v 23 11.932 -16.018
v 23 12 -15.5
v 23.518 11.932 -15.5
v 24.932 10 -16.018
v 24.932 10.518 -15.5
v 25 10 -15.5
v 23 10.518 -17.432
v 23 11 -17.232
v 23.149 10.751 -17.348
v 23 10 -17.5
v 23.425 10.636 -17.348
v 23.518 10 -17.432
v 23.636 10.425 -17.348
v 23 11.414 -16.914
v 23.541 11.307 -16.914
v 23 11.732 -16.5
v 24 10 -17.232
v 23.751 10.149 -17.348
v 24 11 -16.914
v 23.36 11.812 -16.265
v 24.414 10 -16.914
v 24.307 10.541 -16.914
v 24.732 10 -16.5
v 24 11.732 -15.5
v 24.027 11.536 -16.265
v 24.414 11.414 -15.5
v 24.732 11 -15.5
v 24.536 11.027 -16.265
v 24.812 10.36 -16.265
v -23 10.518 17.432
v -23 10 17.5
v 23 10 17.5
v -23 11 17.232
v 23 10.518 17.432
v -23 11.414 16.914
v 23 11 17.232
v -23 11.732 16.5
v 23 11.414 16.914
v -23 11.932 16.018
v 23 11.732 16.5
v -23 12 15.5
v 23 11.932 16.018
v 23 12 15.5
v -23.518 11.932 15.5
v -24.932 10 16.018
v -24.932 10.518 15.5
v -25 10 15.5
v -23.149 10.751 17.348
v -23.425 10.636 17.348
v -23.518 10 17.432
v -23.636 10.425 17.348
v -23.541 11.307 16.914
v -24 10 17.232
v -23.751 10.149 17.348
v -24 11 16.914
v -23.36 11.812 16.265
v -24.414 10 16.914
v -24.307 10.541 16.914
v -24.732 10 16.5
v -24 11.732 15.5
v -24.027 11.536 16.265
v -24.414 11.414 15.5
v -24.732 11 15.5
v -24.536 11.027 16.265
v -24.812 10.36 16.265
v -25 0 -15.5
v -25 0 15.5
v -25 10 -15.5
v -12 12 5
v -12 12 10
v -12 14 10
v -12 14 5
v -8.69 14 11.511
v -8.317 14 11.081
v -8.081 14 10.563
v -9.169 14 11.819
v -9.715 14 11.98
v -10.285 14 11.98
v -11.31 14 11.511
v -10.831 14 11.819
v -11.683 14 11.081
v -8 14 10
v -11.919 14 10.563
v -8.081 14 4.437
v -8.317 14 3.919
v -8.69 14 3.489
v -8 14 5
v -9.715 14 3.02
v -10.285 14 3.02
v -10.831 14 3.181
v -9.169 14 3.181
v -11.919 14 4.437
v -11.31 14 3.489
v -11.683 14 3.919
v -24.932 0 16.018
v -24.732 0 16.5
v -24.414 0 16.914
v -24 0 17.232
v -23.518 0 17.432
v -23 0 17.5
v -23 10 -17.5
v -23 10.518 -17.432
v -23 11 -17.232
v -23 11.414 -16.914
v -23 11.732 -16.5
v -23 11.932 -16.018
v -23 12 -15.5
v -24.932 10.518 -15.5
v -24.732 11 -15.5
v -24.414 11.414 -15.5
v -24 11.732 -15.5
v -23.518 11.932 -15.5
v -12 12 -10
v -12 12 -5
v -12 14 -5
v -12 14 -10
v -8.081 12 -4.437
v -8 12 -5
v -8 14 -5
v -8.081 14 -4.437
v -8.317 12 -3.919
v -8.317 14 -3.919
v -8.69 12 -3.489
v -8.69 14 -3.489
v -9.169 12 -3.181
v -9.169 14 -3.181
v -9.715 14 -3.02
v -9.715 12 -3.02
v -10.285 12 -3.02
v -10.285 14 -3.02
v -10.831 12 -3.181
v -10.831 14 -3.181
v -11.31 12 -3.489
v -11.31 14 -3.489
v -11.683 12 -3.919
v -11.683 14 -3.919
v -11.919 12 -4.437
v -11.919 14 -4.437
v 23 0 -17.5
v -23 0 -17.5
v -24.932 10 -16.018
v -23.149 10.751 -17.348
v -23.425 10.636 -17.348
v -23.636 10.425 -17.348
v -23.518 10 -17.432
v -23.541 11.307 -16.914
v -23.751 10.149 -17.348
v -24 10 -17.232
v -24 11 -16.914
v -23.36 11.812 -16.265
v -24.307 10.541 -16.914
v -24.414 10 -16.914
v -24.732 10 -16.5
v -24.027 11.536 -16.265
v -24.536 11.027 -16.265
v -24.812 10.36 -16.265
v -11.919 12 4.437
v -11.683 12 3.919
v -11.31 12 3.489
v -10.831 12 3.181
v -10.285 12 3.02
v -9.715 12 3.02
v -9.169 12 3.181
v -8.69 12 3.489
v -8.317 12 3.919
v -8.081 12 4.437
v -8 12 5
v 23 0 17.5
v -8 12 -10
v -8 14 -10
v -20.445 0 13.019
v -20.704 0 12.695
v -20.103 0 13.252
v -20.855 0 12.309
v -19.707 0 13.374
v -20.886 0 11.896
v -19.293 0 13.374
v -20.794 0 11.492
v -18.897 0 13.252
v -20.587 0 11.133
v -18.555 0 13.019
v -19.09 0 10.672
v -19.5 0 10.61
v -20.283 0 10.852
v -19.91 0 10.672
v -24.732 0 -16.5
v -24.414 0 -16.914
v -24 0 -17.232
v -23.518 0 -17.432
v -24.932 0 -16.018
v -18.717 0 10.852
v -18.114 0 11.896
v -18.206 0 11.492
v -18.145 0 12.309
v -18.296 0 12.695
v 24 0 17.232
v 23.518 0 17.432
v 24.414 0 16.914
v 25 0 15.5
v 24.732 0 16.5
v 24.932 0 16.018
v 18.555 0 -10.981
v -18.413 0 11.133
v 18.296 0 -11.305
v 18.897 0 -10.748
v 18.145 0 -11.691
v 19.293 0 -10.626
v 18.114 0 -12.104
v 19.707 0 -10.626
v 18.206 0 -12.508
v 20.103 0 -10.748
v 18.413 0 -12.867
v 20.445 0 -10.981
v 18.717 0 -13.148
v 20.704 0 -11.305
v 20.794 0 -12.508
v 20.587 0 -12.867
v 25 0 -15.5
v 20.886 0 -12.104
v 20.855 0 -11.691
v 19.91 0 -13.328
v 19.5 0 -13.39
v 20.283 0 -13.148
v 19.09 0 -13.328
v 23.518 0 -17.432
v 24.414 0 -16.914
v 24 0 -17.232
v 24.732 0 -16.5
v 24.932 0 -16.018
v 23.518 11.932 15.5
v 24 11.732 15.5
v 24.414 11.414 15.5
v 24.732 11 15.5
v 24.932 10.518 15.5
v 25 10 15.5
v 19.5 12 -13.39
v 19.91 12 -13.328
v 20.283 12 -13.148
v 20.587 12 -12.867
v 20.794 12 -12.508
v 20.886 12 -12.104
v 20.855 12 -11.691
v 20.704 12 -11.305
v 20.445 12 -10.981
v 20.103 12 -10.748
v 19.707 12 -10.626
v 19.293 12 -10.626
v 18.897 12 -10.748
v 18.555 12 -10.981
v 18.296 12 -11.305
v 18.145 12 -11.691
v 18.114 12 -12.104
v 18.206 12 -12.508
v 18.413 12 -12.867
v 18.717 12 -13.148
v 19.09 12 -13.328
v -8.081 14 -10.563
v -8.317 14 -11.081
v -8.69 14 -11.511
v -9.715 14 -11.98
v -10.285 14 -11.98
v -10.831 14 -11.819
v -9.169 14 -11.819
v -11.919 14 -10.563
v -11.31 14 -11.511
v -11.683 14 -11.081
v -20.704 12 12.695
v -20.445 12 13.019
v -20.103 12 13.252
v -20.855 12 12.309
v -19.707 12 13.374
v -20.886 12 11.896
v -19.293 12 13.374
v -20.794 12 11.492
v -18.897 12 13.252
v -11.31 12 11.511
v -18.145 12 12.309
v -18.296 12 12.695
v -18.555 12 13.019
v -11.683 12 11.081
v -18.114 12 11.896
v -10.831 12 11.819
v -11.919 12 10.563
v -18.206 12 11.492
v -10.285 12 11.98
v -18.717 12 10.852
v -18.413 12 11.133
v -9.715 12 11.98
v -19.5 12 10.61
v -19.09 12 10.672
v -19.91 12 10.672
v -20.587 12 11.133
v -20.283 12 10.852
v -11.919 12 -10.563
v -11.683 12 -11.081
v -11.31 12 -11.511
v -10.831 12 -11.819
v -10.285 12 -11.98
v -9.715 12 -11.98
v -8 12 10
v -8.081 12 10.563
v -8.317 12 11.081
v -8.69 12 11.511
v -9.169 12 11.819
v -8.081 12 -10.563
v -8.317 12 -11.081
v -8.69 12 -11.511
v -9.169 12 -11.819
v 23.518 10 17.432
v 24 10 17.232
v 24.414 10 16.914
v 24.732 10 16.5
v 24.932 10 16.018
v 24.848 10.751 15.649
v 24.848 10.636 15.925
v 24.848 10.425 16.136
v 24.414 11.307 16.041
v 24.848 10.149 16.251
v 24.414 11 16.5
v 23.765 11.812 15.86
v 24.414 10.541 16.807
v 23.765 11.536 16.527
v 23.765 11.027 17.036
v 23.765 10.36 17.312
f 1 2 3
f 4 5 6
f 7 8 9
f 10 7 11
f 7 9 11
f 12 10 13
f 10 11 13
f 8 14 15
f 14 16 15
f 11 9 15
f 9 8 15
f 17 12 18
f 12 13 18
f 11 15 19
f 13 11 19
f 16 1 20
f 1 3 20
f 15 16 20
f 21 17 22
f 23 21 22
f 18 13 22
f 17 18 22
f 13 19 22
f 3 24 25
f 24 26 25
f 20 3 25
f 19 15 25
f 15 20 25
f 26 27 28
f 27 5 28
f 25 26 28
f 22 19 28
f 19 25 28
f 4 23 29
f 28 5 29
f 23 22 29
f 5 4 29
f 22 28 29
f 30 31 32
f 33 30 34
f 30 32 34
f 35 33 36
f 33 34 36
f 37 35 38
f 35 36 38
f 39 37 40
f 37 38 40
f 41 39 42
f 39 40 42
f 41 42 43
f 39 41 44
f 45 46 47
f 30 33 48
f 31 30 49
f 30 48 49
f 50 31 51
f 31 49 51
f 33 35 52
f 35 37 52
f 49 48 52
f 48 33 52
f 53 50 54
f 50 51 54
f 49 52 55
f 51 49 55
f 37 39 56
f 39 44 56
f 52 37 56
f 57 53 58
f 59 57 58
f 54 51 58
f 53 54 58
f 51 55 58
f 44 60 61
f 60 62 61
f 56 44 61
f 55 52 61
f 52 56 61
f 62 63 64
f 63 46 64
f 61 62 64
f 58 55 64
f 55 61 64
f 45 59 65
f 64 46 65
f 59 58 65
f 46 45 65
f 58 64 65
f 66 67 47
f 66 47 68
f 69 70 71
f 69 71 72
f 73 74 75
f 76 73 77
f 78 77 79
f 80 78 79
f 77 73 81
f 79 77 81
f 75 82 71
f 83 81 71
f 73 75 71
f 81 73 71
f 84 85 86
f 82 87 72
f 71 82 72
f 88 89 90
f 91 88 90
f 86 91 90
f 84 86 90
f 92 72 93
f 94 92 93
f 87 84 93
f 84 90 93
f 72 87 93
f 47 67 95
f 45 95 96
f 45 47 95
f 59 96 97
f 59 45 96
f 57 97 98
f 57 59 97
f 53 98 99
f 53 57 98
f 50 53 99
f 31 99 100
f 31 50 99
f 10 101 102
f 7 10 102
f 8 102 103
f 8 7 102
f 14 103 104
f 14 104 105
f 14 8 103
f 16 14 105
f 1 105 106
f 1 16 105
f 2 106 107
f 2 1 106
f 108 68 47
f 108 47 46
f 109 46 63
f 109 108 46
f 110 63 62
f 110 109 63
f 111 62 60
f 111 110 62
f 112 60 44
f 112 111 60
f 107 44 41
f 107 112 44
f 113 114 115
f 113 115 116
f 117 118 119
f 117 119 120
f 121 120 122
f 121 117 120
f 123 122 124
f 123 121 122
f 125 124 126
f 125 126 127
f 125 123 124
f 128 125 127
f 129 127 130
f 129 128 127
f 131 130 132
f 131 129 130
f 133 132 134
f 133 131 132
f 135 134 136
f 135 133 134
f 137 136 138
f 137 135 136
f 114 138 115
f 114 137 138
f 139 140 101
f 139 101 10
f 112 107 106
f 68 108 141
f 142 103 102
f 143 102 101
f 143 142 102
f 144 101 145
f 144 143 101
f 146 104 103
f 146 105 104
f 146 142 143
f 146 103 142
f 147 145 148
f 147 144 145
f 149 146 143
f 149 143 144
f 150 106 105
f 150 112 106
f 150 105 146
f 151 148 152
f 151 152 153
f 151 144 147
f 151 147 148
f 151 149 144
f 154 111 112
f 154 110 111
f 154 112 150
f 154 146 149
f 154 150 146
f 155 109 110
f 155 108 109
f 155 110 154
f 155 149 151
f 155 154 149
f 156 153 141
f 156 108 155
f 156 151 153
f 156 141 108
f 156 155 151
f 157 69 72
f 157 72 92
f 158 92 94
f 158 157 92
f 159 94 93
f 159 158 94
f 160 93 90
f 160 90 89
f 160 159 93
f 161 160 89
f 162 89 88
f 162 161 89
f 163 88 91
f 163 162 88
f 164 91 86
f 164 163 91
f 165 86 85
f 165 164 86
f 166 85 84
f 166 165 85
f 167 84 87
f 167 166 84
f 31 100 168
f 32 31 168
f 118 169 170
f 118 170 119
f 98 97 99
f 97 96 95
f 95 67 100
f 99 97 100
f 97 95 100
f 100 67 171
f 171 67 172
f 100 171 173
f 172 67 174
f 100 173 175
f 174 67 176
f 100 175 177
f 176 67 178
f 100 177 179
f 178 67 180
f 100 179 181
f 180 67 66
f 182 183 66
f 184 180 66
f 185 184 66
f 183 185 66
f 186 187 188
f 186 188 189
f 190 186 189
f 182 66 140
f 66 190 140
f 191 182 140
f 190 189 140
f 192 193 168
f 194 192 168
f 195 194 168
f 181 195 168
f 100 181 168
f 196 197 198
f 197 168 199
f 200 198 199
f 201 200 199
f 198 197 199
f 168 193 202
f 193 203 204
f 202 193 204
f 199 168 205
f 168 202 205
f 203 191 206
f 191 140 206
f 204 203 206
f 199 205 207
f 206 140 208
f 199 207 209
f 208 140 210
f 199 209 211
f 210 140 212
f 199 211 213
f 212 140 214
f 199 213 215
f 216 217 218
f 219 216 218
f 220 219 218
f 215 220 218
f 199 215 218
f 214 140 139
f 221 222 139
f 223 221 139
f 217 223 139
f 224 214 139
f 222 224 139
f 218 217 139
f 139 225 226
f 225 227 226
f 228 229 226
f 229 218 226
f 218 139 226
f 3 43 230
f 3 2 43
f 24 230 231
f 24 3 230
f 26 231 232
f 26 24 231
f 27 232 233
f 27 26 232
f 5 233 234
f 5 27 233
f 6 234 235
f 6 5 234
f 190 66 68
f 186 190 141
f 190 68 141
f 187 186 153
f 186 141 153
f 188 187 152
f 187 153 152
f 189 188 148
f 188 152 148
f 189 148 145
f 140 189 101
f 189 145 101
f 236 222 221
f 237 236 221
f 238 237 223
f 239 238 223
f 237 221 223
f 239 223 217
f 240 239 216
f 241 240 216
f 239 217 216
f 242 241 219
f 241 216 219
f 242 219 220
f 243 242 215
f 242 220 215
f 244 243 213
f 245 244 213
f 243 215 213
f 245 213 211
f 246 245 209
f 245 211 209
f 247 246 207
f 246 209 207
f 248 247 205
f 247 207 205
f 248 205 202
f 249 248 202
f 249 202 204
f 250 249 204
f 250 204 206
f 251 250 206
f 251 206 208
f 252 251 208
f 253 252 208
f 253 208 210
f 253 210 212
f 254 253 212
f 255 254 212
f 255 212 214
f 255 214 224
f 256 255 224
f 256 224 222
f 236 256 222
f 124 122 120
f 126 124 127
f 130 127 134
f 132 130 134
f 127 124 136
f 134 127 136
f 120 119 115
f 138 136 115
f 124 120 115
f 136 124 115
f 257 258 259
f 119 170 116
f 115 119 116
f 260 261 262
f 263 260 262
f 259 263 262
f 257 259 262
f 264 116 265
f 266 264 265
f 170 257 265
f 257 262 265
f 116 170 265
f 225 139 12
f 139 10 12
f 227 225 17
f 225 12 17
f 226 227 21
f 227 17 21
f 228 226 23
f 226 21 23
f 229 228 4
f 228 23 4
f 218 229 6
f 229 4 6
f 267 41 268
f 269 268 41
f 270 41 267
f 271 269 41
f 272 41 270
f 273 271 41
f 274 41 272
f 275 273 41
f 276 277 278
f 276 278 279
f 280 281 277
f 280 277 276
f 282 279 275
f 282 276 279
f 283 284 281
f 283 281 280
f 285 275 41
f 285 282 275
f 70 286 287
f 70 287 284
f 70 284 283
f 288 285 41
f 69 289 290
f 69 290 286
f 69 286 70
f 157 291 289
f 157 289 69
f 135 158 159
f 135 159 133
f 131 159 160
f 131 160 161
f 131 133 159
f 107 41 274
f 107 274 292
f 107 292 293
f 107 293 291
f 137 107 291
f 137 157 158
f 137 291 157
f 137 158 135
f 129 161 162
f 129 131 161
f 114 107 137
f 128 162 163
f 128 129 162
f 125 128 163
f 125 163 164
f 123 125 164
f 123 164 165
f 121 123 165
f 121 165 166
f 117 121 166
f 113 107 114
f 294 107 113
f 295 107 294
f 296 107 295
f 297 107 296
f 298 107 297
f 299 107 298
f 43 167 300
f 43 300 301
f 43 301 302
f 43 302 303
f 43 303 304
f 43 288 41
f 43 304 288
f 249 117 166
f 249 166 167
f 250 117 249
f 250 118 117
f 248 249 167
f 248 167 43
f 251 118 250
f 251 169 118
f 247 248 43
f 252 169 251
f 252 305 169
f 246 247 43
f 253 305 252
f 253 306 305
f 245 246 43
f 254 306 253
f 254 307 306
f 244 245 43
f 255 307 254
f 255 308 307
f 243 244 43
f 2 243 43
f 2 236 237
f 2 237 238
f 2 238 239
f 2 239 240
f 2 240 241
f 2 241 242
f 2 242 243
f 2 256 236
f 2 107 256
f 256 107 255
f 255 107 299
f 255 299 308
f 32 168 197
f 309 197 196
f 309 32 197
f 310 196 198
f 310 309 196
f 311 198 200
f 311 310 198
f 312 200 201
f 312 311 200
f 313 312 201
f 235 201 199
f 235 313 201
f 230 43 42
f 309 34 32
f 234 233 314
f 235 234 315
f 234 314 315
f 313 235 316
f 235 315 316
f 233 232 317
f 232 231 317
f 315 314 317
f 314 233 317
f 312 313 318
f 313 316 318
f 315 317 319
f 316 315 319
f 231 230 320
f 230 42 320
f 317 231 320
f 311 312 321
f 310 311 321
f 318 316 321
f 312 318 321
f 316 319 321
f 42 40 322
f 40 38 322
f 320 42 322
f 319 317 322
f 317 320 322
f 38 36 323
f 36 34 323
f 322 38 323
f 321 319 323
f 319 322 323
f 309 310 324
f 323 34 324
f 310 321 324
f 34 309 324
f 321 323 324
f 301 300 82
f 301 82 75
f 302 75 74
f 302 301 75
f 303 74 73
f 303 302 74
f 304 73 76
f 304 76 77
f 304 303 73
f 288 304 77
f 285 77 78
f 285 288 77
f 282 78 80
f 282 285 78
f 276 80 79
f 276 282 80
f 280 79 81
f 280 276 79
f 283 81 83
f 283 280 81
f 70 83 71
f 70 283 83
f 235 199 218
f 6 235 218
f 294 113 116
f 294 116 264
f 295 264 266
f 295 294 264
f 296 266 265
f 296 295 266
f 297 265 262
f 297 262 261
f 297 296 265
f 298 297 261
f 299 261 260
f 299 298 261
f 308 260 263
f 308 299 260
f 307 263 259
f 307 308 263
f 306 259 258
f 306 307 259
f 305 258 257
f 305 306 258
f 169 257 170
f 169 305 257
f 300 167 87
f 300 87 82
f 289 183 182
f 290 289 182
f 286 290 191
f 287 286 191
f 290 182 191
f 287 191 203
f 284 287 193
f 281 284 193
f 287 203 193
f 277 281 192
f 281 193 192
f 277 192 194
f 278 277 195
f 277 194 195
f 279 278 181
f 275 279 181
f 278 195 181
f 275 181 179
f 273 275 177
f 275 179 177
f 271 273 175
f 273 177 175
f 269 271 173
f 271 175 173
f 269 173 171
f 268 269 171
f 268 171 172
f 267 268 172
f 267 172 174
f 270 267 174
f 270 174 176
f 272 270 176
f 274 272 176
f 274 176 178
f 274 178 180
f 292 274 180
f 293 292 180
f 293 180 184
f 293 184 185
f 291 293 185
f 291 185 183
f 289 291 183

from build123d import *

# Parameters (mm, degrees)
SKETCH1_W           = 50
SKETCH1_H           = 35
BOSS_EXTRUDE1_DEPTH = 12
BOSS_EXTRUDE2_DEPTH = 2
FILLET1_R           = 2
SKETCH4_R           = 1.39
CUT_EXTRUDE1_DEPTH  = 34.574543928


with BuildPart() as part:
    # Sketch1 → Boss-Extrude1 (new body)
    with BuildSketch(Plane(origin=(0, 0, 0), x_dir=(1, 0, 0), z_dir=(0, 1, 0))):
        Rectangle(SKETCH1_W, SKETCH1_H)
    extrude(amount=BOSS_EXTRUDE1_DEPTH)

    # Sketch2 → Boss-Extrude2 (add)
    with BuildSketch(Plane(origin=(0, 12, 0), x_dir=(1, 0, 0), z_dir=(0, 1, 0))):
        with BuildLine():
            Line((-8, 10), (-8, 5))
            ThreePointArc((-8, 5), (-10, 3), (-12, 5))
            Line((-12, 5), (-12, 10))
            ThreePointArc((-12, 10), (-10, 12), (-8, 10))
        make_face()
        with BuildLine():
            Line((-8, -5), (-8, -10))
            ThreePointArc((-8, -10), (-10, -12), (-12, -10))
            Line((-12, -10), (-12, -5))
            ThreePointArc((-12, -5), (-10, -3), (-8, -5))
        make_face()
    extrude(amount=BOSS_EXTRUDE2_DEPTH)

    # Fillet1
    fillet1_edges = [part.edges().sort_by_distance(p)[0] for p in [
        (-25, 12, 0),
        (0, 12, 17.5),
        (25, 12, 0),
        (0, 12, -17.5),
        (25, 6, 17.5),
        (-25, 6, 17.5),
        (-25, 6, -17.5),
        (25, 6, -17.5),
    ]]
    fillet(fillet1_edges, radius=FILLET1_R)

    # Sketch4 → Cut-Extrude1 (cut, through all)
    with BuildSketch(Plane.XZ):
        with Locations(Location((-19.5, 12, 0), (0, 0, 270))):
            Circle(SKETCH4_R)
        with Locations(Location((19.5, -12, 0), (0, 0, 270))):
            Circle(SKETCH4_R)
    extrude(amount=-CUT_EXTRUDE1_DEPTH, mode=Mode.SUBTRACT)


solid = part.part
